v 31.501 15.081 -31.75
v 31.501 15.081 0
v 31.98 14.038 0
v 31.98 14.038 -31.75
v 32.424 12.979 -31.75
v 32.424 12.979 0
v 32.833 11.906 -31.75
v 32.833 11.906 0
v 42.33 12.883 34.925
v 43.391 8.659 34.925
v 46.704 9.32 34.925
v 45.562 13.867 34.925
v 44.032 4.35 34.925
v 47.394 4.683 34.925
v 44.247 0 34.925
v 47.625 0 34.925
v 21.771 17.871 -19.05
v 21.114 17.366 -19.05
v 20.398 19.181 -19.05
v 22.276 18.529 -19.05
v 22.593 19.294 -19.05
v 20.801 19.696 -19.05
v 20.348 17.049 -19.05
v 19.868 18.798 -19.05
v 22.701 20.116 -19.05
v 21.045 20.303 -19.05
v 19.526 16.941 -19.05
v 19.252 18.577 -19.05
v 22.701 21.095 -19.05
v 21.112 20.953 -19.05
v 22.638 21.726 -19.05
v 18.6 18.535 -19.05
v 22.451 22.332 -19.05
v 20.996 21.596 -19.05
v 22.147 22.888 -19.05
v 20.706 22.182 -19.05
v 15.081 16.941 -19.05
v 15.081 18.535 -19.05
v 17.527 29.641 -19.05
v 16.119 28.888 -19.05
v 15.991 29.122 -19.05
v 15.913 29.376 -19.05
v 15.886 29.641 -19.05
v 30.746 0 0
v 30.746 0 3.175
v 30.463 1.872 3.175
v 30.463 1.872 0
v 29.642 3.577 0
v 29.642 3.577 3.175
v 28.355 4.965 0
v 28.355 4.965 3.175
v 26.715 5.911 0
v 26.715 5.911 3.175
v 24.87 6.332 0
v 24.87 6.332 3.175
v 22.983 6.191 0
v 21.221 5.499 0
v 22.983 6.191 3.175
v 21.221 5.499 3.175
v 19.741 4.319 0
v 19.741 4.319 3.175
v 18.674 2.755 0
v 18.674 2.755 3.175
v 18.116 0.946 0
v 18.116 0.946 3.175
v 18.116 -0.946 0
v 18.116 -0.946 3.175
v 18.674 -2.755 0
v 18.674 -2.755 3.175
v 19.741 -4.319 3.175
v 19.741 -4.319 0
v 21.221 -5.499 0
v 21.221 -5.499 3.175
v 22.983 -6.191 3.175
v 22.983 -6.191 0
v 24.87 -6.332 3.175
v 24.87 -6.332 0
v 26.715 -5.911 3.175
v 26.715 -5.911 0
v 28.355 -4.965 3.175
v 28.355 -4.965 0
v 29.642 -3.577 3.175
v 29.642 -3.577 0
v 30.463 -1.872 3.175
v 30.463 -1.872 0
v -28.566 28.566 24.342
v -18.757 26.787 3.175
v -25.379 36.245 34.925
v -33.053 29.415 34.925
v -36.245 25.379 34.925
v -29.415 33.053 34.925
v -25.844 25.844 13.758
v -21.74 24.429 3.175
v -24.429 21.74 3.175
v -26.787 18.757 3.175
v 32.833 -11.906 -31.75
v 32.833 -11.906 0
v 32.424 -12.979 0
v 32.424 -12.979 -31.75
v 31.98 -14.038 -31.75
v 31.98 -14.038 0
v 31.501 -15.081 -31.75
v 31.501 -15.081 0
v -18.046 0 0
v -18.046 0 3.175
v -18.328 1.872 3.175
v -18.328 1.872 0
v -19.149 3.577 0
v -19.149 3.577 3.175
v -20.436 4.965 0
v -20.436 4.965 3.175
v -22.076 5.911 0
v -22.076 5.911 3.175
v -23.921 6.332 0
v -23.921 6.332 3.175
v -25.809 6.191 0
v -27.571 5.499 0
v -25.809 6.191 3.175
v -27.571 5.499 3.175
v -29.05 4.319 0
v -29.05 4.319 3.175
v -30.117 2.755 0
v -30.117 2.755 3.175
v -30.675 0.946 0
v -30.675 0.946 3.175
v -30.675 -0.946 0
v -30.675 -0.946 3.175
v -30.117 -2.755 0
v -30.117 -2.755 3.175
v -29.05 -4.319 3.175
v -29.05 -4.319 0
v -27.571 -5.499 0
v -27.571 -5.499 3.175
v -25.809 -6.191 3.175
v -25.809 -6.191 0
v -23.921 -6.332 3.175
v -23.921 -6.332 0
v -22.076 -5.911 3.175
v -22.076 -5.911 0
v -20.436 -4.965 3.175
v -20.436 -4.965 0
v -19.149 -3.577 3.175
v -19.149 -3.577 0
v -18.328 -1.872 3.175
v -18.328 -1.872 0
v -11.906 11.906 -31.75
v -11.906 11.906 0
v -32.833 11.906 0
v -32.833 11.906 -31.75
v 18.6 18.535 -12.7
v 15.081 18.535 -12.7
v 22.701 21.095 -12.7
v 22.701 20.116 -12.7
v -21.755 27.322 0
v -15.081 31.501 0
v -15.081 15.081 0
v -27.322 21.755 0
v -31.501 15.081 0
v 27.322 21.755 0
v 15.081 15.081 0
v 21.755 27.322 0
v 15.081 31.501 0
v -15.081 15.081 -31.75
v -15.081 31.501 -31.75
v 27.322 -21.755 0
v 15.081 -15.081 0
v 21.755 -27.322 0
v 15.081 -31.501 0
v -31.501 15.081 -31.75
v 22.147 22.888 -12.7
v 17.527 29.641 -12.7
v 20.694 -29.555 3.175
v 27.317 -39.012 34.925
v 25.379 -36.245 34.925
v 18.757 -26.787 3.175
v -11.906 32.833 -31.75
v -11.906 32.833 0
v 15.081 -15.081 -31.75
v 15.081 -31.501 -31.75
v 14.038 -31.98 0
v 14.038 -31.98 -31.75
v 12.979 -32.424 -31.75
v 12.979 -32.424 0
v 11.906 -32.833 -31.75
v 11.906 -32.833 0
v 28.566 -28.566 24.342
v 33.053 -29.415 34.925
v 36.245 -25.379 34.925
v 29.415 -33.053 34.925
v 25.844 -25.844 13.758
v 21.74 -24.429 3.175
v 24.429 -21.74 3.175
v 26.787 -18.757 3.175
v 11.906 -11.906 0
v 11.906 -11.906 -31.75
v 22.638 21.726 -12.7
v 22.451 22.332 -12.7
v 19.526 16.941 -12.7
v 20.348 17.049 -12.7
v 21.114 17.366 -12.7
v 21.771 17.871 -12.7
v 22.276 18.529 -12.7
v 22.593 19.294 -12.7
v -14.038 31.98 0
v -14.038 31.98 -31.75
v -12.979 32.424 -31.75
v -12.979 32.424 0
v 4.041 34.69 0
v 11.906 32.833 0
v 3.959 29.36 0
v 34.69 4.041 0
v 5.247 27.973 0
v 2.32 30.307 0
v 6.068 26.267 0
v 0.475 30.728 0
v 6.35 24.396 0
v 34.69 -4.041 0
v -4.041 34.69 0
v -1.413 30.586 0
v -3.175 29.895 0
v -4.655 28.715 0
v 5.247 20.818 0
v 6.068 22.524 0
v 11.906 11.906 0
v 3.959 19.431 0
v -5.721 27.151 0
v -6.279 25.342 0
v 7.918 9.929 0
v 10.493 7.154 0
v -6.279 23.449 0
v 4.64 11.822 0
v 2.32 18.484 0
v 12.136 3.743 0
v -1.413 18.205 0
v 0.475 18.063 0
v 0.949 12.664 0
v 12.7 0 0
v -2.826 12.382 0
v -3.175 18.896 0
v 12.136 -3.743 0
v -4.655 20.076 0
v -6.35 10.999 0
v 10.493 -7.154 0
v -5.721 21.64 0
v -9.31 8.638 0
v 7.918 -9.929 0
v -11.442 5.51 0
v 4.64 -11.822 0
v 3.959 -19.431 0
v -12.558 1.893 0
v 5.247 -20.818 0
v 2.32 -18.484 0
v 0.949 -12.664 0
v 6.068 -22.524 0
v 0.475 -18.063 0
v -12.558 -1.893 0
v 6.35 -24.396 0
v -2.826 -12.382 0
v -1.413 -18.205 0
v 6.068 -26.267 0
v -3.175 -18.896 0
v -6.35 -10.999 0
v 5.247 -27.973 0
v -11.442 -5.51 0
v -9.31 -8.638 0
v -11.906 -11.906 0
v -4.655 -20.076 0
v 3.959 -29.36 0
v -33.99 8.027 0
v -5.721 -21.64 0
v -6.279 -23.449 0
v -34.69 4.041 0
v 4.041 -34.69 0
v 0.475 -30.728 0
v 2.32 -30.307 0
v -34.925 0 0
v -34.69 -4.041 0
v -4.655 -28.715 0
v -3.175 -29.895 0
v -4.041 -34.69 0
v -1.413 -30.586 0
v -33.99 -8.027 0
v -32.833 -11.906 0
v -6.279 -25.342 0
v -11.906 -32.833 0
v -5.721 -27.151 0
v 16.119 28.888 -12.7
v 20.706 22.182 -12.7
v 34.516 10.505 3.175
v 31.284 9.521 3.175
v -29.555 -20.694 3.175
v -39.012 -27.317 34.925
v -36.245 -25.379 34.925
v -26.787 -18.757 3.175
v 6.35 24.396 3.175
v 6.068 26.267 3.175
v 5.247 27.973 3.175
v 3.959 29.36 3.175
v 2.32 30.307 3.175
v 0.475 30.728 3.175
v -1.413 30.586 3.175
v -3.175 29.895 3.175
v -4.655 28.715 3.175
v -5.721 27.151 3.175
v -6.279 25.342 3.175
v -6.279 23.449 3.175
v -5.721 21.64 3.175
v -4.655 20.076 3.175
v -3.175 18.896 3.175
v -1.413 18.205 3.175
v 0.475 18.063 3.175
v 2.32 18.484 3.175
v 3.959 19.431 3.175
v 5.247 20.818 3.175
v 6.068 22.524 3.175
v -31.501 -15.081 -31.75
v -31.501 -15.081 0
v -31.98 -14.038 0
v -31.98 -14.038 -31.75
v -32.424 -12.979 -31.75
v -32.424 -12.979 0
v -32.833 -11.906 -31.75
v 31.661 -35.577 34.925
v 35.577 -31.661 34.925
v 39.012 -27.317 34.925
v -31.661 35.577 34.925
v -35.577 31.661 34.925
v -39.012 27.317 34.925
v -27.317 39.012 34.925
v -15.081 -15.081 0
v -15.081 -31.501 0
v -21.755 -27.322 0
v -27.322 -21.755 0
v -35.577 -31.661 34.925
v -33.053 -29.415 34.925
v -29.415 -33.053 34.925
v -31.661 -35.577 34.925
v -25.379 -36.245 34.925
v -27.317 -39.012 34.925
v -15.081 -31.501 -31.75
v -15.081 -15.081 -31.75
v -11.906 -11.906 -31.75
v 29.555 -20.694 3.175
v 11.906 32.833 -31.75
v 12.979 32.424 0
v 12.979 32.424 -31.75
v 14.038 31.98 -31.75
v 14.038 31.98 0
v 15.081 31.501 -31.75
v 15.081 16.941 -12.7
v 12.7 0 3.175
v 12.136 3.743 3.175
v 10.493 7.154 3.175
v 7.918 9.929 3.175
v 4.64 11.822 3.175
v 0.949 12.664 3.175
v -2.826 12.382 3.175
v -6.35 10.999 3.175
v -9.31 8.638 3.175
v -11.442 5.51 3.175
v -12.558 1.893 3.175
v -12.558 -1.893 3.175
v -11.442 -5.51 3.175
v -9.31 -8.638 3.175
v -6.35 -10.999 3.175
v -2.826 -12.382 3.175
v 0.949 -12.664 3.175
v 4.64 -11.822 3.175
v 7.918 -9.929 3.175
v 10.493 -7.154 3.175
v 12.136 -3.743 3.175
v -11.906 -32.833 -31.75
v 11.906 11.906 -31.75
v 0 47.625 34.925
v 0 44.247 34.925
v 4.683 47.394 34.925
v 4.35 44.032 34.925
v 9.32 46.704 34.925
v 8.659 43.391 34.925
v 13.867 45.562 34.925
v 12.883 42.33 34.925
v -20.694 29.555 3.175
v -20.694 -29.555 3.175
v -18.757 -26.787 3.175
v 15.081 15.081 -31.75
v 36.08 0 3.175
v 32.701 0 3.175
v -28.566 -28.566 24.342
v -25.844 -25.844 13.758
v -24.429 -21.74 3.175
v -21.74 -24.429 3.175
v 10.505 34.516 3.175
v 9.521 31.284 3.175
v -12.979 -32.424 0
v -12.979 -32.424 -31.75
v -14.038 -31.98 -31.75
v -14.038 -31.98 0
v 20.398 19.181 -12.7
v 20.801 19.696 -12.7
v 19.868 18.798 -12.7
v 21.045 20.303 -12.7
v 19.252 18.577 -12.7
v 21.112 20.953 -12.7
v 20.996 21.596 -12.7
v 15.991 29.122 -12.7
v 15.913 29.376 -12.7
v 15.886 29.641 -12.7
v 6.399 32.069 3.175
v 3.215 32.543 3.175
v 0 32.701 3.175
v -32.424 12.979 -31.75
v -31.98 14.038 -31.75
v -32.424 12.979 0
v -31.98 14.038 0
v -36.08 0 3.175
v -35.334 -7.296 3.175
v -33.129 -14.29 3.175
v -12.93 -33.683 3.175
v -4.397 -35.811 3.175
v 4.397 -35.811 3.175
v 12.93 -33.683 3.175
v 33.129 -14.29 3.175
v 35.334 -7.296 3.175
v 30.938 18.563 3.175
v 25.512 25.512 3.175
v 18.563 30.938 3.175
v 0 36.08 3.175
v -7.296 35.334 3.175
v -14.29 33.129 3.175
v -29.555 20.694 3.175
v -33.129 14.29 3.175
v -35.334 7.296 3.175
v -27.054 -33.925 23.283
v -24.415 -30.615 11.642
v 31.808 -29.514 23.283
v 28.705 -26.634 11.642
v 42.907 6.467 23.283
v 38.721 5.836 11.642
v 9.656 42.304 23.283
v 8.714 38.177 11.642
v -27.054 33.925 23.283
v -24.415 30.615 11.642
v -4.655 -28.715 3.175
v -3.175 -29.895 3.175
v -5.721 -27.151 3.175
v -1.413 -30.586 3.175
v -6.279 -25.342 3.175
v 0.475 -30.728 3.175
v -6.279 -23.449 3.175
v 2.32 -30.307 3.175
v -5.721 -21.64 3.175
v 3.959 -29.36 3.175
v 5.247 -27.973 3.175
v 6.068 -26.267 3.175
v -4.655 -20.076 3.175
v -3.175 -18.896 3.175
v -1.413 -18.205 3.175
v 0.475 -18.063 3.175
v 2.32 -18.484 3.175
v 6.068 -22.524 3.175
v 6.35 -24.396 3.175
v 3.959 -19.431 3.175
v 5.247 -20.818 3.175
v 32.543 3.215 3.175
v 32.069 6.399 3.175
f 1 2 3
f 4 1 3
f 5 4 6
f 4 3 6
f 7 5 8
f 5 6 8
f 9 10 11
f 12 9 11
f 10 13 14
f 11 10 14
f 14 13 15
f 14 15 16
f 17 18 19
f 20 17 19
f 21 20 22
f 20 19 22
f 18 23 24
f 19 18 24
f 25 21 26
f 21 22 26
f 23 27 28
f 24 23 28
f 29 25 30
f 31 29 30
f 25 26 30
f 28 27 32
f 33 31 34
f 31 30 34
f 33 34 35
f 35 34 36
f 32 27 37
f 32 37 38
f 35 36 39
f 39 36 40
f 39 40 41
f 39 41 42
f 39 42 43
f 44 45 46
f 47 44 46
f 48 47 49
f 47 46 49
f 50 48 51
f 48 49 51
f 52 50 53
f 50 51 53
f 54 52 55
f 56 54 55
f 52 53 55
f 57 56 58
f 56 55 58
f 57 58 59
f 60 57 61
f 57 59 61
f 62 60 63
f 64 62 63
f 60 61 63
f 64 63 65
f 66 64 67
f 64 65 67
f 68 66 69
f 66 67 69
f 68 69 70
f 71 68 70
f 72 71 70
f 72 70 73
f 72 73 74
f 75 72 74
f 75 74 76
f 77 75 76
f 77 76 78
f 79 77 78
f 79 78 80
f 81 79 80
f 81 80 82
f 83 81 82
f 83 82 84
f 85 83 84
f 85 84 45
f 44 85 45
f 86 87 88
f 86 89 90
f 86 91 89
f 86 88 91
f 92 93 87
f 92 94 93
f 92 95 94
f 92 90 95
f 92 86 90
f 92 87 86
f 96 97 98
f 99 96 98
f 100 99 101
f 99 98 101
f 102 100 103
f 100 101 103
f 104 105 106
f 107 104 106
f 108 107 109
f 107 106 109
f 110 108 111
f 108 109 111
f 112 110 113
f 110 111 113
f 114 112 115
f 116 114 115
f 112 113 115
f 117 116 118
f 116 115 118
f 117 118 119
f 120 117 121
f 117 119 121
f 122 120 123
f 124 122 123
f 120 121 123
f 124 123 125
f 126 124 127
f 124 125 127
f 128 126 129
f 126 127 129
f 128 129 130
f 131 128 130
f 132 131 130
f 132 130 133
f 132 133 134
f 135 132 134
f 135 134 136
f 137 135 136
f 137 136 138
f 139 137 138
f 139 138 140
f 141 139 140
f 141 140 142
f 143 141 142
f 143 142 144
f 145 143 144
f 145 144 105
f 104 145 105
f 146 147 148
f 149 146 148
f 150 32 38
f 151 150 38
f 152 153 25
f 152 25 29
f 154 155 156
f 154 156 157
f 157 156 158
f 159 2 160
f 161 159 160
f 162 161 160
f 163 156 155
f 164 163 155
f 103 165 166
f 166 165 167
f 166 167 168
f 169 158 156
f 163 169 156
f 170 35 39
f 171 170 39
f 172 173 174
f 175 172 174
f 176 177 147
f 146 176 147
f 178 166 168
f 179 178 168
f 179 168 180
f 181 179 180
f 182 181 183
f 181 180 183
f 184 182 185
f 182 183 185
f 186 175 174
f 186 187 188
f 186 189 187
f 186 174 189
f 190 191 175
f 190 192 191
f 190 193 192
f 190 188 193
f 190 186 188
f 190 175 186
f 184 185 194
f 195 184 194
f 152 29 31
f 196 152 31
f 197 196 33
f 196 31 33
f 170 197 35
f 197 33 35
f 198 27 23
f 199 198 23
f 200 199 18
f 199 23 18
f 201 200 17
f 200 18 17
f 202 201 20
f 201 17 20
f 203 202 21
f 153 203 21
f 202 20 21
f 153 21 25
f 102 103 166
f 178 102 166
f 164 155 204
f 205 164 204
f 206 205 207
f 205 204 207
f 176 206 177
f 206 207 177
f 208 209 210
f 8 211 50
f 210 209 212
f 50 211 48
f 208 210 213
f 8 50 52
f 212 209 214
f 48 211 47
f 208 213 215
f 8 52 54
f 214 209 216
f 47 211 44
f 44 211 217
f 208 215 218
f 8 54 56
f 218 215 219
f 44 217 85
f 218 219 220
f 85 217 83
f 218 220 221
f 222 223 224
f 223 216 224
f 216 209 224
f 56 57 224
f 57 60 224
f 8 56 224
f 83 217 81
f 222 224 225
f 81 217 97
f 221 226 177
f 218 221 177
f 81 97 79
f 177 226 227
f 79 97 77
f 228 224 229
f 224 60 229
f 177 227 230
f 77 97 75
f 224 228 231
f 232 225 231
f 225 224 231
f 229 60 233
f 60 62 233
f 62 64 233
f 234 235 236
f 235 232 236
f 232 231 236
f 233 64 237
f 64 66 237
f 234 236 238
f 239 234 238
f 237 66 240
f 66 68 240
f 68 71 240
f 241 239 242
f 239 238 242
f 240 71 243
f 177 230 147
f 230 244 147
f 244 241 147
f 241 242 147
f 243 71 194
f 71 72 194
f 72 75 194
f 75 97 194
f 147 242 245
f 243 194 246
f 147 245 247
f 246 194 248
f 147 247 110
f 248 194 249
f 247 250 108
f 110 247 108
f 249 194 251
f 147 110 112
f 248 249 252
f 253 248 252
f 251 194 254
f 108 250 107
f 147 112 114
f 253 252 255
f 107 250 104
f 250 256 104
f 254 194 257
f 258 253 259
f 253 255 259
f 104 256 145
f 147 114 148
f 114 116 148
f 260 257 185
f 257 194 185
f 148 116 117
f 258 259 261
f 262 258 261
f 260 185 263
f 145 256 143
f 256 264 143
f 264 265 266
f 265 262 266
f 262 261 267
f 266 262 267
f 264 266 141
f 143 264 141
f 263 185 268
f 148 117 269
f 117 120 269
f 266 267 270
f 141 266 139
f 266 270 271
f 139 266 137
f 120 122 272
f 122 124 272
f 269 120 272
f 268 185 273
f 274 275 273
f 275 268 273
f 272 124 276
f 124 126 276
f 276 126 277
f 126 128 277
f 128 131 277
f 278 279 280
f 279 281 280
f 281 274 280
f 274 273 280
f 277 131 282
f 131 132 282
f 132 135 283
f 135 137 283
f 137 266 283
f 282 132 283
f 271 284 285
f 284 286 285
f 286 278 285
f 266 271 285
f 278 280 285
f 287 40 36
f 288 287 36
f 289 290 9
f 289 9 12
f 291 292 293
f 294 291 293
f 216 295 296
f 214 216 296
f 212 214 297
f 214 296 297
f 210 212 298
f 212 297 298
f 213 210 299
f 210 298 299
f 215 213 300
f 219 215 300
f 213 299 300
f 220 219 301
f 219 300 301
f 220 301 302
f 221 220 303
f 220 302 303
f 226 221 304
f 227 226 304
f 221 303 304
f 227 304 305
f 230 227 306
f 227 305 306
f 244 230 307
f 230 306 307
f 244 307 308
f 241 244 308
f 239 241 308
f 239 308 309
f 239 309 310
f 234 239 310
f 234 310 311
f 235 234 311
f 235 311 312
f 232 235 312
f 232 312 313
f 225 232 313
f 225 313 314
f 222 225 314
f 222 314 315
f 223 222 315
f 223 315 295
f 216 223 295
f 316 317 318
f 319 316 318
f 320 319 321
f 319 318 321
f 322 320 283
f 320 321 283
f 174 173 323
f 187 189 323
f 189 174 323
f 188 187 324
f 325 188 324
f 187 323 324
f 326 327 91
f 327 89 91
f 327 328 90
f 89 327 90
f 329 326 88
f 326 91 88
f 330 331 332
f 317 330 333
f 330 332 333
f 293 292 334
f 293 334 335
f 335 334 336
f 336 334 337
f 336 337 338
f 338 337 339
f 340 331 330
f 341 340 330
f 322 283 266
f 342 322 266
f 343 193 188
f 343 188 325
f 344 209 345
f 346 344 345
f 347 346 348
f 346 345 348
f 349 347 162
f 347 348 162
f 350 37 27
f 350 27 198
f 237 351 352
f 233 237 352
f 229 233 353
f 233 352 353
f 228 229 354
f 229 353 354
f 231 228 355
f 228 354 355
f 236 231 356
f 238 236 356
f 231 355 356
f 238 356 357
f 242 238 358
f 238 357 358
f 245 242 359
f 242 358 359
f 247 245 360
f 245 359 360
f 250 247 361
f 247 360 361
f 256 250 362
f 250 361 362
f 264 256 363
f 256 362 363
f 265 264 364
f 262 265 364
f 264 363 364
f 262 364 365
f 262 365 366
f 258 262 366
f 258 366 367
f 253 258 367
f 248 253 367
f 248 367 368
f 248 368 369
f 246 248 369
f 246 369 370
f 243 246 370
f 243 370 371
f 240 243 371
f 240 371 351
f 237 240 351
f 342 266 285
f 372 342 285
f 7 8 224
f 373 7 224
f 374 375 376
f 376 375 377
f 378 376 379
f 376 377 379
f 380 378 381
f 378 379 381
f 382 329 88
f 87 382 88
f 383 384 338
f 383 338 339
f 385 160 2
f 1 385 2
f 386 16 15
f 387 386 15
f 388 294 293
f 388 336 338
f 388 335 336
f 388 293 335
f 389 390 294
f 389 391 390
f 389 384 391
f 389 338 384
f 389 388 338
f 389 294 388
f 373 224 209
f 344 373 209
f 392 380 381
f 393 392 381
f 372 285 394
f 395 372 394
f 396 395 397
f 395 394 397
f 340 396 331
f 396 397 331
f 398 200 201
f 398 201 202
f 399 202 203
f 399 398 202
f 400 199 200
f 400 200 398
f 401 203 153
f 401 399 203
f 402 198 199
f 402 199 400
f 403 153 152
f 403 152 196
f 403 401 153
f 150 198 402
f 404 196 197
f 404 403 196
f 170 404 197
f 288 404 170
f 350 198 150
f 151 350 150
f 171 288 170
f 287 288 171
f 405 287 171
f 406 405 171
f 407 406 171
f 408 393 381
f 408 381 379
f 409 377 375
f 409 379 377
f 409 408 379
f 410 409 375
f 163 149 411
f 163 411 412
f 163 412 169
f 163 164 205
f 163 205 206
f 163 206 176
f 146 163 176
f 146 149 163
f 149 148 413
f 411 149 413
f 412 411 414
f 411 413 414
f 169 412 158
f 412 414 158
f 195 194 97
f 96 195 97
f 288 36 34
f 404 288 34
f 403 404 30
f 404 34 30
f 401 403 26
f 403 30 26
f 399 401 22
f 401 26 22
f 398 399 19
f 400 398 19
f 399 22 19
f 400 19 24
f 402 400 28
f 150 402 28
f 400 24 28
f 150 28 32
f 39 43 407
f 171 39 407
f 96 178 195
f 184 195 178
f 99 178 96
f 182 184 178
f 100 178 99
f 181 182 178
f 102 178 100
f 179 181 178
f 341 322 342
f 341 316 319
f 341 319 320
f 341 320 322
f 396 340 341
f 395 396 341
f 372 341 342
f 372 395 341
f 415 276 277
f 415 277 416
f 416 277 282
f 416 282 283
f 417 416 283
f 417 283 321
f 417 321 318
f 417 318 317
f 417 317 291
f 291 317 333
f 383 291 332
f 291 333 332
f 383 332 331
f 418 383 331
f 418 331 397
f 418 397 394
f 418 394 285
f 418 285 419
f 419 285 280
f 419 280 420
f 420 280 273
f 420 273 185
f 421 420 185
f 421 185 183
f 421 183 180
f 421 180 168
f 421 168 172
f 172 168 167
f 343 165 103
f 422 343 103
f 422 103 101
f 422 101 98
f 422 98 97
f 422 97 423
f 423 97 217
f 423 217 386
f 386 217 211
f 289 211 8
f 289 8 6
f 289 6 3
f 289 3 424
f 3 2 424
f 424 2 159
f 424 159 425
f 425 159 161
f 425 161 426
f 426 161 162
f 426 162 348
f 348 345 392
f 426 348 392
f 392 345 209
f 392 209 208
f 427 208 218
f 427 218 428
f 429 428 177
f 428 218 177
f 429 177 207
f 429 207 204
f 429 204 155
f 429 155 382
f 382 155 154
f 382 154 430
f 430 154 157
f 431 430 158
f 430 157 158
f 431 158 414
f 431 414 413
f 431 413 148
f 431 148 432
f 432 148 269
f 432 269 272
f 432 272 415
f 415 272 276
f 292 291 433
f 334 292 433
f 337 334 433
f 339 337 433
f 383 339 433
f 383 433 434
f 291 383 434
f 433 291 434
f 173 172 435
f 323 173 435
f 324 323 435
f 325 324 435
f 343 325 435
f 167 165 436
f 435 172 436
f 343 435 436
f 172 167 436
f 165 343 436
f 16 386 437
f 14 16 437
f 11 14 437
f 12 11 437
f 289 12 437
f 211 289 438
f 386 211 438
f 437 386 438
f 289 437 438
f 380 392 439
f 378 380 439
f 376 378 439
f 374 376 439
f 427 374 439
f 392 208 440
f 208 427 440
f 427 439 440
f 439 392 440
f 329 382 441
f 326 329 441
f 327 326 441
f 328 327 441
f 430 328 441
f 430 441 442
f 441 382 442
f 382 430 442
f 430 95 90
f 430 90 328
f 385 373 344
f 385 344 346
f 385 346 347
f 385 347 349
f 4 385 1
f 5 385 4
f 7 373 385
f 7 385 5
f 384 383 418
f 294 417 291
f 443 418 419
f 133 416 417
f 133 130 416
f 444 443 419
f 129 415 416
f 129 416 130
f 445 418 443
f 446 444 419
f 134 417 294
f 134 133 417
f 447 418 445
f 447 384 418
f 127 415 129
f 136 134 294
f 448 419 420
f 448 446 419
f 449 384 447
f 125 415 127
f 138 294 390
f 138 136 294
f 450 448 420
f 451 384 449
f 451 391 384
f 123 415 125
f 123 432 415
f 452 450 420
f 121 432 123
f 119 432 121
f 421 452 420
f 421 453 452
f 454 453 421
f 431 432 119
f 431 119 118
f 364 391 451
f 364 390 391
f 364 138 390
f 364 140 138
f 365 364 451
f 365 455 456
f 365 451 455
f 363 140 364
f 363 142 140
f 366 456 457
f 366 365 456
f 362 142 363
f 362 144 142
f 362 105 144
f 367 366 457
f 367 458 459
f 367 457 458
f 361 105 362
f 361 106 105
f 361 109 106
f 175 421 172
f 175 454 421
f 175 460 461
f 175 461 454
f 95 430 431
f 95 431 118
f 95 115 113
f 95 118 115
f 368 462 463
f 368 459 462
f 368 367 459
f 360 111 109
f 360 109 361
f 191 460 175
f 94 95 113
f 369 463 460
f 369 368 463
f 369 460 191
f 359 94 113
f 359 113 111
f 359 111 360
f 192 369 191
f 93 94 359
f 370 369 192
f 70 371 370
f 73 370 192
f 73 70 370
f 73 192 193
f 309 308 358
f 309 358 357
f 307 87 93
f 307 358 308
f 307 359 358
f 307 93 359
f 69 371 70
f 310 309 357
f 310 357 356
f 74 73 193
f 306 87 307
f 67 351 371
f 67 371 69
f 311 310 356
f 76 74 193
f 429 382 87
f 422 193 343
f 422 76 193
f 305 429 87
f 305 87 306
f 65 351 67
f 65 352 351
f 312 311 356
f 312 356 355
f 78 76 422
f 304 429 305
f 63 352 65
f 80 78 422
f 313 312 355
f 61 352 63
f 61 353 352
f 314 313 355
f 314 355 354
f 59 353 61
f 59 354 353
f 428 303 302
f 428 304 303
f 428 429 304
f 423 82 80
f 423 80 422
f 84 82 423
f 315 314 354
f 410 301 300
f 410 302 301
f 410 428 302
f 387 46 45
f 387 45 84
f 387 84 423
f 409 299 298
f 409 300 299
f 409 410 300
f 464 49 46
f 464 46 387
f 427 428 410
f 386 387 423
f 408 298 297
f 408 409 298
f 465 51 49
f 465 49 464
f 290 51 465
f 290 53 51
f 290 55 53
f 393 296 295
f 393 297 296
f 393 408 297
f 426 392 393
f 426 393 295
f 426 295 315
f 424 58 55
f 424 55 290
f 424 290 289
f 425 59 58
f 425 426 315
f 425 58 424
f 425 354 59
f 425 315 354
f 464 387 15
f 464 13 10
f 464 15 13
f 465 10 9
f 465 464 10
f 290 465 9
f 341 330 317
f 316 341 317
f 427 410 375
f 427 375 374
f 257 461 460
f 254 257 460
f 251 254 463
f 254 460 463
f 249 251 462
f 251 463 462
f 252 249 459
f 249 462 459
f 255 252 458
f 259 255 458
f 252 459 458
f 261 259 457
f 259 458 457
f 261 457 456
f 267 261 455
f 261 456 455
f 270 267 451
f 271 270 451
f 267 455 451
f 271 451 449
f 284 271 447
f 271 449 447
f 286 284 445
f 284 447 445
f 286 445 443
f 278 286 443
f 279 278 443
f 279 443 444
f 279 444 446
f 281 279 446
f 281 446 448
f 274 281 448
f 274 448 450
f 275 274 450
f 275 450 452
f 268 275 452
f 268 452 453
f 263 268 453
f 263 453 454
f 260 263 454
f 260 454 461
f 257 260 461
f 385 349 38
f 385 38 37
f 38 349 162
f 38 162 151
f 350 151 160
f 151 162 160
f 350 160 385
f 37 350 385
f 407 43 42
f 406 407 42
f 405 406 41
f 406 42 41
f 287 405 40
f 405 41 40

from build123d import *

# Parameters (mm, degrees)
F3_T      = -3.175
F5_DEPTH  = 31.75
F7_DEPTH  = 31.75
F9_DEPTH  = 31.75
F10_R     = 12.7
F11_DEPTH = 25.4
F12_W     = 12.7
F12_H     = 6.35
F13_DEPTH = 7.62
F15_DEPTH = 6.35
F16_R     = 6.35
F17_DEPTH = 25.4


with BuildPart() as f2:
    # F0 (on Front) → F2 (revolve)
    with BuildSketch(Plane.XZ):
        Polygon((-34.925, 0), (0, 0), (0, 34.925), (-47.625, 34.925), align=None)
    revolve(axis=Axis((0, 0, 24.3954025209), (0, 0, 1)))

    # F3
    f3_openings = [f2.faces().sort_by_distance(p)[0] for p in [
        (0, 0, 34.925),
    ]]
    offset(amount=F3_T, openings=f3_openings)

    # F4 (on face) → F5 (join)
    with BuildSketch(Plane(origin=(0, 0, 0), x_dir=(1, 0, 0), z_dir=(0, 0, -1))):
        with BuildLine():
            Line((-32.8328621344, 11.90625), (-11.90625, 11.90625))
            Line((-11.90625, 11.90625), (-11.90625, 32.8328621344))
            ThreePointArc((-11.90625, 32.8328621344), (-13.5101727919, 32.2060686227), (-15.08125, 31.5009765474))
            Line((-15.08125, 31.5009765474), (-15.08125, 15.08125))
            Line((-15.08125, 15.08125), (-31.5009765474, 15.08125))
            ThreePointArc((-31.5009765474, 15.08125), (-32.2060686227, 13.5101727919), (-32.8328621344, 11.90625))
        make_face()
        with BuildLine():
            Line((-11.90625, -32.8328621344), (-11.90625, -11.90625))
            Line((-11.90625, -11.90625), (-32.8328621344, -11.90625))
            ThreePointArc((-32.8328621344, -11.90625), (-32.2060686227, -13.5101727919), (-31.5009765474, -15.08125))
            Line((-31.5009765474, -15.08125), (-15.08125, -15.08125))
            Line((-15.08125, -15.08125), (-15.08125, -31.5009765474))
            ThreePointArc((-15.08125, -31.5009765474), (-13.5101727919, -32.2060686227), (-11.90625, -32.8328621344))
        make_face()
        with BuildLine():
            Line((32.8328621344, -11.90625), (11.90625, -11.90625))
            Line((11.90625, -11.90625), (11.90625, -32.8328621344))
            ThreePointArc((11.90625, -32.8328621344), (13.5101727919, -32.2060686227), (15.08125, -31.5009765474))
            Line((15.08125, -31.5009765474), (15.08125, -15.08125))
            Line((15.08125, -15.08125), (31.5009765474, -15.08125))
            ThreePointArc((31.5009765474, -15.08125), (32.2060686227, -13.5101727919), (32.8328621344, -11.90625))
        make_face()
        with BuildLine():
            Line((11.90625, 32.8328621344), (11.90625, 11.90625))
            Line((11.90625, 11.90625), (32.8328621344, 11.90625))
            ThreePointArc((32.8328621344, 11.90625), (32.2060686227, 13.5101727919), (31.5009765474, 15.08125))
            Line((31.5009765474, 15.08125), (15.08125, 15.08125))
            Line((15.08125, 15.08125), (15.08125, 31.5009765474))
            ThreePointArc((15.08125, 31.5009765474), (13.5101727919, 32.2060686227), (11.90625, 32.8328621344))
        make_face()
    extrude(amount=F5_DEPTH)

    # F6 (on face) → F7 (cut, through all)
    with BuildSketch(Plane.XY.offset(34.925)):
        Polygon((15.7154482119, 51.6364726961), (0, 0), (51.6364726961, 15.7154482119), (33.675960454, 33.675960454), align=None)
    extrude(amount=-F7_DEPTH, mode=Mode.SUBTRACT)

    # F8 (on face) → F9 (cut, through all)
    with BuildSketch(Plane.XY.offset(34.925)):
        with BuildLine():
            Line((-27.3165777812, 39.0121161093), (0, 0))
            Line((0, 0), (0, 47.625))
            ThreePointArc((0, 47.625), (-14.3211137014, 45.4207697794), (-27.3165777812, 39.0121161093))
        make_face()
        with BuildLine():
            Line((-39.0121161093, -27.3165777812), (0, 0))
            Line((0, 0), (-39.0121161093, 27.3165777812))
            ThreePointArc((-39.0121161093, 27.3165777812), (-47.625, 0), (-39.0121161093, -27.3165777812))
        make_face()
        with BuildLine():
            Line((27.3165777812, -39.0121161093), (0, 0))
            Line((0, 0), (-27.3165777812, -39.0121161093))
            ThreePointArc((-27.3165777812, -39.0121161093), (0, -47.625), (27.3165777812, -39.0121161093))
        make_face()
        with BuildLine():
            Line((47.625, 0), (0, 0))
            Line((0, 0), (39.0121161093, -27.3165777812))
            ThreePointArc((39.0121161093, -27.3165777812), (45.4207697794, -14.3211137014), (47.625, 0))
        make_face()
    extrude(amount=-F9_DEPTH, mode=Mode.SUBTRACT)

    # F10 (on face) → F11 (cut)
    with BuildSketch(Plane.XY.offset(3.175)):
        Circle(F10_R)
    extrude(amount=-F11_DEPTH, mode=Mode.SUBTRACT)

    # F12 (on face) → F13 (join)
    with BuildSketch(Plane.YZ.offset(15.08125)):
        with Locations((23.2911132737, -15.875)):
            Rectangle(F12_W, F12_H)
    extrude(amount=F13_DEPTH)

    # F14 (on face) → F15 (cut, through all)
    with BuildSketch(Plane(origin=(0, 0, -19.05), x_dir=(1, 0, 0), z_dir=(0, 0, -1))):
        with BuildLine():
            Line((16.1188345795, -28.8882274593), (20.7059307299, -22.1824388165))
            ThreePointArc((20.7059307299, -22.1824388165), (20.8007868478, -19.6961173416), (18.5999628156, -18.5354426503))
            Line((18.5999628156, -18.5354426503), (15.08125, -18.5354426503))
            Line((15.08125, -18.5354426503), (15.08125, -29.6411132737))
            Line((15.08125, -29.6411132737), (15.885964036, -29.6411132737))
            ThreePointArc((15.885964036, -29.6411132737), (15.9455112052, -29.2470746527), (16.1188345795, -28.8882274593))
        make_face()
        with BuildLine():
            ThreePointArc((19.52625, -16.9411132737), (21.7713140303, -17.8710492434), (22.70125, -20.1161132737))
            Line((22.70125, -20.1161132737), (22.70125, -16.9411132737))
            Line((22.70125, -16.9411132737), (19.52625, -16.9411132737))
        make_face()
        with BuildLine():
            Line((22.1467963251, -22.8878208585), (17.527205209, -29.6411132737))
            Line((17.527205209, -29.6411132737), (22.70125, -29.6411132737))
            Line((22.70125, -29.6411132737), (22.70125, -21.0952355863))
            ThreePointArc((22.70125, -21.0952355863), (22.5594710257, -22.0334227792), (22.1467963251, -22.8878208585))
        make_face()
    extrude(amount=-F15_DEPTH, mode=Mode.SUBTRACT)

    # F16 (on face) → F17 (cut)
    with BuildSketch(Plane.XY.offset(3.175)):
        with Locations((-24.3955454545, 0)):
            Circle(F16_R)
        with Locations((0, -24.3955454545)):
            Circle(F16_R)
        with Locations((24.3955454545, 0)):
            Circle(F16_R)
        with Locations((0, 24.3955454545)):
            Circle(F16_R)
    extrude(amount=-F17_DEPTH, mode=Mode.SUBTRACT)


solid = f2.part
